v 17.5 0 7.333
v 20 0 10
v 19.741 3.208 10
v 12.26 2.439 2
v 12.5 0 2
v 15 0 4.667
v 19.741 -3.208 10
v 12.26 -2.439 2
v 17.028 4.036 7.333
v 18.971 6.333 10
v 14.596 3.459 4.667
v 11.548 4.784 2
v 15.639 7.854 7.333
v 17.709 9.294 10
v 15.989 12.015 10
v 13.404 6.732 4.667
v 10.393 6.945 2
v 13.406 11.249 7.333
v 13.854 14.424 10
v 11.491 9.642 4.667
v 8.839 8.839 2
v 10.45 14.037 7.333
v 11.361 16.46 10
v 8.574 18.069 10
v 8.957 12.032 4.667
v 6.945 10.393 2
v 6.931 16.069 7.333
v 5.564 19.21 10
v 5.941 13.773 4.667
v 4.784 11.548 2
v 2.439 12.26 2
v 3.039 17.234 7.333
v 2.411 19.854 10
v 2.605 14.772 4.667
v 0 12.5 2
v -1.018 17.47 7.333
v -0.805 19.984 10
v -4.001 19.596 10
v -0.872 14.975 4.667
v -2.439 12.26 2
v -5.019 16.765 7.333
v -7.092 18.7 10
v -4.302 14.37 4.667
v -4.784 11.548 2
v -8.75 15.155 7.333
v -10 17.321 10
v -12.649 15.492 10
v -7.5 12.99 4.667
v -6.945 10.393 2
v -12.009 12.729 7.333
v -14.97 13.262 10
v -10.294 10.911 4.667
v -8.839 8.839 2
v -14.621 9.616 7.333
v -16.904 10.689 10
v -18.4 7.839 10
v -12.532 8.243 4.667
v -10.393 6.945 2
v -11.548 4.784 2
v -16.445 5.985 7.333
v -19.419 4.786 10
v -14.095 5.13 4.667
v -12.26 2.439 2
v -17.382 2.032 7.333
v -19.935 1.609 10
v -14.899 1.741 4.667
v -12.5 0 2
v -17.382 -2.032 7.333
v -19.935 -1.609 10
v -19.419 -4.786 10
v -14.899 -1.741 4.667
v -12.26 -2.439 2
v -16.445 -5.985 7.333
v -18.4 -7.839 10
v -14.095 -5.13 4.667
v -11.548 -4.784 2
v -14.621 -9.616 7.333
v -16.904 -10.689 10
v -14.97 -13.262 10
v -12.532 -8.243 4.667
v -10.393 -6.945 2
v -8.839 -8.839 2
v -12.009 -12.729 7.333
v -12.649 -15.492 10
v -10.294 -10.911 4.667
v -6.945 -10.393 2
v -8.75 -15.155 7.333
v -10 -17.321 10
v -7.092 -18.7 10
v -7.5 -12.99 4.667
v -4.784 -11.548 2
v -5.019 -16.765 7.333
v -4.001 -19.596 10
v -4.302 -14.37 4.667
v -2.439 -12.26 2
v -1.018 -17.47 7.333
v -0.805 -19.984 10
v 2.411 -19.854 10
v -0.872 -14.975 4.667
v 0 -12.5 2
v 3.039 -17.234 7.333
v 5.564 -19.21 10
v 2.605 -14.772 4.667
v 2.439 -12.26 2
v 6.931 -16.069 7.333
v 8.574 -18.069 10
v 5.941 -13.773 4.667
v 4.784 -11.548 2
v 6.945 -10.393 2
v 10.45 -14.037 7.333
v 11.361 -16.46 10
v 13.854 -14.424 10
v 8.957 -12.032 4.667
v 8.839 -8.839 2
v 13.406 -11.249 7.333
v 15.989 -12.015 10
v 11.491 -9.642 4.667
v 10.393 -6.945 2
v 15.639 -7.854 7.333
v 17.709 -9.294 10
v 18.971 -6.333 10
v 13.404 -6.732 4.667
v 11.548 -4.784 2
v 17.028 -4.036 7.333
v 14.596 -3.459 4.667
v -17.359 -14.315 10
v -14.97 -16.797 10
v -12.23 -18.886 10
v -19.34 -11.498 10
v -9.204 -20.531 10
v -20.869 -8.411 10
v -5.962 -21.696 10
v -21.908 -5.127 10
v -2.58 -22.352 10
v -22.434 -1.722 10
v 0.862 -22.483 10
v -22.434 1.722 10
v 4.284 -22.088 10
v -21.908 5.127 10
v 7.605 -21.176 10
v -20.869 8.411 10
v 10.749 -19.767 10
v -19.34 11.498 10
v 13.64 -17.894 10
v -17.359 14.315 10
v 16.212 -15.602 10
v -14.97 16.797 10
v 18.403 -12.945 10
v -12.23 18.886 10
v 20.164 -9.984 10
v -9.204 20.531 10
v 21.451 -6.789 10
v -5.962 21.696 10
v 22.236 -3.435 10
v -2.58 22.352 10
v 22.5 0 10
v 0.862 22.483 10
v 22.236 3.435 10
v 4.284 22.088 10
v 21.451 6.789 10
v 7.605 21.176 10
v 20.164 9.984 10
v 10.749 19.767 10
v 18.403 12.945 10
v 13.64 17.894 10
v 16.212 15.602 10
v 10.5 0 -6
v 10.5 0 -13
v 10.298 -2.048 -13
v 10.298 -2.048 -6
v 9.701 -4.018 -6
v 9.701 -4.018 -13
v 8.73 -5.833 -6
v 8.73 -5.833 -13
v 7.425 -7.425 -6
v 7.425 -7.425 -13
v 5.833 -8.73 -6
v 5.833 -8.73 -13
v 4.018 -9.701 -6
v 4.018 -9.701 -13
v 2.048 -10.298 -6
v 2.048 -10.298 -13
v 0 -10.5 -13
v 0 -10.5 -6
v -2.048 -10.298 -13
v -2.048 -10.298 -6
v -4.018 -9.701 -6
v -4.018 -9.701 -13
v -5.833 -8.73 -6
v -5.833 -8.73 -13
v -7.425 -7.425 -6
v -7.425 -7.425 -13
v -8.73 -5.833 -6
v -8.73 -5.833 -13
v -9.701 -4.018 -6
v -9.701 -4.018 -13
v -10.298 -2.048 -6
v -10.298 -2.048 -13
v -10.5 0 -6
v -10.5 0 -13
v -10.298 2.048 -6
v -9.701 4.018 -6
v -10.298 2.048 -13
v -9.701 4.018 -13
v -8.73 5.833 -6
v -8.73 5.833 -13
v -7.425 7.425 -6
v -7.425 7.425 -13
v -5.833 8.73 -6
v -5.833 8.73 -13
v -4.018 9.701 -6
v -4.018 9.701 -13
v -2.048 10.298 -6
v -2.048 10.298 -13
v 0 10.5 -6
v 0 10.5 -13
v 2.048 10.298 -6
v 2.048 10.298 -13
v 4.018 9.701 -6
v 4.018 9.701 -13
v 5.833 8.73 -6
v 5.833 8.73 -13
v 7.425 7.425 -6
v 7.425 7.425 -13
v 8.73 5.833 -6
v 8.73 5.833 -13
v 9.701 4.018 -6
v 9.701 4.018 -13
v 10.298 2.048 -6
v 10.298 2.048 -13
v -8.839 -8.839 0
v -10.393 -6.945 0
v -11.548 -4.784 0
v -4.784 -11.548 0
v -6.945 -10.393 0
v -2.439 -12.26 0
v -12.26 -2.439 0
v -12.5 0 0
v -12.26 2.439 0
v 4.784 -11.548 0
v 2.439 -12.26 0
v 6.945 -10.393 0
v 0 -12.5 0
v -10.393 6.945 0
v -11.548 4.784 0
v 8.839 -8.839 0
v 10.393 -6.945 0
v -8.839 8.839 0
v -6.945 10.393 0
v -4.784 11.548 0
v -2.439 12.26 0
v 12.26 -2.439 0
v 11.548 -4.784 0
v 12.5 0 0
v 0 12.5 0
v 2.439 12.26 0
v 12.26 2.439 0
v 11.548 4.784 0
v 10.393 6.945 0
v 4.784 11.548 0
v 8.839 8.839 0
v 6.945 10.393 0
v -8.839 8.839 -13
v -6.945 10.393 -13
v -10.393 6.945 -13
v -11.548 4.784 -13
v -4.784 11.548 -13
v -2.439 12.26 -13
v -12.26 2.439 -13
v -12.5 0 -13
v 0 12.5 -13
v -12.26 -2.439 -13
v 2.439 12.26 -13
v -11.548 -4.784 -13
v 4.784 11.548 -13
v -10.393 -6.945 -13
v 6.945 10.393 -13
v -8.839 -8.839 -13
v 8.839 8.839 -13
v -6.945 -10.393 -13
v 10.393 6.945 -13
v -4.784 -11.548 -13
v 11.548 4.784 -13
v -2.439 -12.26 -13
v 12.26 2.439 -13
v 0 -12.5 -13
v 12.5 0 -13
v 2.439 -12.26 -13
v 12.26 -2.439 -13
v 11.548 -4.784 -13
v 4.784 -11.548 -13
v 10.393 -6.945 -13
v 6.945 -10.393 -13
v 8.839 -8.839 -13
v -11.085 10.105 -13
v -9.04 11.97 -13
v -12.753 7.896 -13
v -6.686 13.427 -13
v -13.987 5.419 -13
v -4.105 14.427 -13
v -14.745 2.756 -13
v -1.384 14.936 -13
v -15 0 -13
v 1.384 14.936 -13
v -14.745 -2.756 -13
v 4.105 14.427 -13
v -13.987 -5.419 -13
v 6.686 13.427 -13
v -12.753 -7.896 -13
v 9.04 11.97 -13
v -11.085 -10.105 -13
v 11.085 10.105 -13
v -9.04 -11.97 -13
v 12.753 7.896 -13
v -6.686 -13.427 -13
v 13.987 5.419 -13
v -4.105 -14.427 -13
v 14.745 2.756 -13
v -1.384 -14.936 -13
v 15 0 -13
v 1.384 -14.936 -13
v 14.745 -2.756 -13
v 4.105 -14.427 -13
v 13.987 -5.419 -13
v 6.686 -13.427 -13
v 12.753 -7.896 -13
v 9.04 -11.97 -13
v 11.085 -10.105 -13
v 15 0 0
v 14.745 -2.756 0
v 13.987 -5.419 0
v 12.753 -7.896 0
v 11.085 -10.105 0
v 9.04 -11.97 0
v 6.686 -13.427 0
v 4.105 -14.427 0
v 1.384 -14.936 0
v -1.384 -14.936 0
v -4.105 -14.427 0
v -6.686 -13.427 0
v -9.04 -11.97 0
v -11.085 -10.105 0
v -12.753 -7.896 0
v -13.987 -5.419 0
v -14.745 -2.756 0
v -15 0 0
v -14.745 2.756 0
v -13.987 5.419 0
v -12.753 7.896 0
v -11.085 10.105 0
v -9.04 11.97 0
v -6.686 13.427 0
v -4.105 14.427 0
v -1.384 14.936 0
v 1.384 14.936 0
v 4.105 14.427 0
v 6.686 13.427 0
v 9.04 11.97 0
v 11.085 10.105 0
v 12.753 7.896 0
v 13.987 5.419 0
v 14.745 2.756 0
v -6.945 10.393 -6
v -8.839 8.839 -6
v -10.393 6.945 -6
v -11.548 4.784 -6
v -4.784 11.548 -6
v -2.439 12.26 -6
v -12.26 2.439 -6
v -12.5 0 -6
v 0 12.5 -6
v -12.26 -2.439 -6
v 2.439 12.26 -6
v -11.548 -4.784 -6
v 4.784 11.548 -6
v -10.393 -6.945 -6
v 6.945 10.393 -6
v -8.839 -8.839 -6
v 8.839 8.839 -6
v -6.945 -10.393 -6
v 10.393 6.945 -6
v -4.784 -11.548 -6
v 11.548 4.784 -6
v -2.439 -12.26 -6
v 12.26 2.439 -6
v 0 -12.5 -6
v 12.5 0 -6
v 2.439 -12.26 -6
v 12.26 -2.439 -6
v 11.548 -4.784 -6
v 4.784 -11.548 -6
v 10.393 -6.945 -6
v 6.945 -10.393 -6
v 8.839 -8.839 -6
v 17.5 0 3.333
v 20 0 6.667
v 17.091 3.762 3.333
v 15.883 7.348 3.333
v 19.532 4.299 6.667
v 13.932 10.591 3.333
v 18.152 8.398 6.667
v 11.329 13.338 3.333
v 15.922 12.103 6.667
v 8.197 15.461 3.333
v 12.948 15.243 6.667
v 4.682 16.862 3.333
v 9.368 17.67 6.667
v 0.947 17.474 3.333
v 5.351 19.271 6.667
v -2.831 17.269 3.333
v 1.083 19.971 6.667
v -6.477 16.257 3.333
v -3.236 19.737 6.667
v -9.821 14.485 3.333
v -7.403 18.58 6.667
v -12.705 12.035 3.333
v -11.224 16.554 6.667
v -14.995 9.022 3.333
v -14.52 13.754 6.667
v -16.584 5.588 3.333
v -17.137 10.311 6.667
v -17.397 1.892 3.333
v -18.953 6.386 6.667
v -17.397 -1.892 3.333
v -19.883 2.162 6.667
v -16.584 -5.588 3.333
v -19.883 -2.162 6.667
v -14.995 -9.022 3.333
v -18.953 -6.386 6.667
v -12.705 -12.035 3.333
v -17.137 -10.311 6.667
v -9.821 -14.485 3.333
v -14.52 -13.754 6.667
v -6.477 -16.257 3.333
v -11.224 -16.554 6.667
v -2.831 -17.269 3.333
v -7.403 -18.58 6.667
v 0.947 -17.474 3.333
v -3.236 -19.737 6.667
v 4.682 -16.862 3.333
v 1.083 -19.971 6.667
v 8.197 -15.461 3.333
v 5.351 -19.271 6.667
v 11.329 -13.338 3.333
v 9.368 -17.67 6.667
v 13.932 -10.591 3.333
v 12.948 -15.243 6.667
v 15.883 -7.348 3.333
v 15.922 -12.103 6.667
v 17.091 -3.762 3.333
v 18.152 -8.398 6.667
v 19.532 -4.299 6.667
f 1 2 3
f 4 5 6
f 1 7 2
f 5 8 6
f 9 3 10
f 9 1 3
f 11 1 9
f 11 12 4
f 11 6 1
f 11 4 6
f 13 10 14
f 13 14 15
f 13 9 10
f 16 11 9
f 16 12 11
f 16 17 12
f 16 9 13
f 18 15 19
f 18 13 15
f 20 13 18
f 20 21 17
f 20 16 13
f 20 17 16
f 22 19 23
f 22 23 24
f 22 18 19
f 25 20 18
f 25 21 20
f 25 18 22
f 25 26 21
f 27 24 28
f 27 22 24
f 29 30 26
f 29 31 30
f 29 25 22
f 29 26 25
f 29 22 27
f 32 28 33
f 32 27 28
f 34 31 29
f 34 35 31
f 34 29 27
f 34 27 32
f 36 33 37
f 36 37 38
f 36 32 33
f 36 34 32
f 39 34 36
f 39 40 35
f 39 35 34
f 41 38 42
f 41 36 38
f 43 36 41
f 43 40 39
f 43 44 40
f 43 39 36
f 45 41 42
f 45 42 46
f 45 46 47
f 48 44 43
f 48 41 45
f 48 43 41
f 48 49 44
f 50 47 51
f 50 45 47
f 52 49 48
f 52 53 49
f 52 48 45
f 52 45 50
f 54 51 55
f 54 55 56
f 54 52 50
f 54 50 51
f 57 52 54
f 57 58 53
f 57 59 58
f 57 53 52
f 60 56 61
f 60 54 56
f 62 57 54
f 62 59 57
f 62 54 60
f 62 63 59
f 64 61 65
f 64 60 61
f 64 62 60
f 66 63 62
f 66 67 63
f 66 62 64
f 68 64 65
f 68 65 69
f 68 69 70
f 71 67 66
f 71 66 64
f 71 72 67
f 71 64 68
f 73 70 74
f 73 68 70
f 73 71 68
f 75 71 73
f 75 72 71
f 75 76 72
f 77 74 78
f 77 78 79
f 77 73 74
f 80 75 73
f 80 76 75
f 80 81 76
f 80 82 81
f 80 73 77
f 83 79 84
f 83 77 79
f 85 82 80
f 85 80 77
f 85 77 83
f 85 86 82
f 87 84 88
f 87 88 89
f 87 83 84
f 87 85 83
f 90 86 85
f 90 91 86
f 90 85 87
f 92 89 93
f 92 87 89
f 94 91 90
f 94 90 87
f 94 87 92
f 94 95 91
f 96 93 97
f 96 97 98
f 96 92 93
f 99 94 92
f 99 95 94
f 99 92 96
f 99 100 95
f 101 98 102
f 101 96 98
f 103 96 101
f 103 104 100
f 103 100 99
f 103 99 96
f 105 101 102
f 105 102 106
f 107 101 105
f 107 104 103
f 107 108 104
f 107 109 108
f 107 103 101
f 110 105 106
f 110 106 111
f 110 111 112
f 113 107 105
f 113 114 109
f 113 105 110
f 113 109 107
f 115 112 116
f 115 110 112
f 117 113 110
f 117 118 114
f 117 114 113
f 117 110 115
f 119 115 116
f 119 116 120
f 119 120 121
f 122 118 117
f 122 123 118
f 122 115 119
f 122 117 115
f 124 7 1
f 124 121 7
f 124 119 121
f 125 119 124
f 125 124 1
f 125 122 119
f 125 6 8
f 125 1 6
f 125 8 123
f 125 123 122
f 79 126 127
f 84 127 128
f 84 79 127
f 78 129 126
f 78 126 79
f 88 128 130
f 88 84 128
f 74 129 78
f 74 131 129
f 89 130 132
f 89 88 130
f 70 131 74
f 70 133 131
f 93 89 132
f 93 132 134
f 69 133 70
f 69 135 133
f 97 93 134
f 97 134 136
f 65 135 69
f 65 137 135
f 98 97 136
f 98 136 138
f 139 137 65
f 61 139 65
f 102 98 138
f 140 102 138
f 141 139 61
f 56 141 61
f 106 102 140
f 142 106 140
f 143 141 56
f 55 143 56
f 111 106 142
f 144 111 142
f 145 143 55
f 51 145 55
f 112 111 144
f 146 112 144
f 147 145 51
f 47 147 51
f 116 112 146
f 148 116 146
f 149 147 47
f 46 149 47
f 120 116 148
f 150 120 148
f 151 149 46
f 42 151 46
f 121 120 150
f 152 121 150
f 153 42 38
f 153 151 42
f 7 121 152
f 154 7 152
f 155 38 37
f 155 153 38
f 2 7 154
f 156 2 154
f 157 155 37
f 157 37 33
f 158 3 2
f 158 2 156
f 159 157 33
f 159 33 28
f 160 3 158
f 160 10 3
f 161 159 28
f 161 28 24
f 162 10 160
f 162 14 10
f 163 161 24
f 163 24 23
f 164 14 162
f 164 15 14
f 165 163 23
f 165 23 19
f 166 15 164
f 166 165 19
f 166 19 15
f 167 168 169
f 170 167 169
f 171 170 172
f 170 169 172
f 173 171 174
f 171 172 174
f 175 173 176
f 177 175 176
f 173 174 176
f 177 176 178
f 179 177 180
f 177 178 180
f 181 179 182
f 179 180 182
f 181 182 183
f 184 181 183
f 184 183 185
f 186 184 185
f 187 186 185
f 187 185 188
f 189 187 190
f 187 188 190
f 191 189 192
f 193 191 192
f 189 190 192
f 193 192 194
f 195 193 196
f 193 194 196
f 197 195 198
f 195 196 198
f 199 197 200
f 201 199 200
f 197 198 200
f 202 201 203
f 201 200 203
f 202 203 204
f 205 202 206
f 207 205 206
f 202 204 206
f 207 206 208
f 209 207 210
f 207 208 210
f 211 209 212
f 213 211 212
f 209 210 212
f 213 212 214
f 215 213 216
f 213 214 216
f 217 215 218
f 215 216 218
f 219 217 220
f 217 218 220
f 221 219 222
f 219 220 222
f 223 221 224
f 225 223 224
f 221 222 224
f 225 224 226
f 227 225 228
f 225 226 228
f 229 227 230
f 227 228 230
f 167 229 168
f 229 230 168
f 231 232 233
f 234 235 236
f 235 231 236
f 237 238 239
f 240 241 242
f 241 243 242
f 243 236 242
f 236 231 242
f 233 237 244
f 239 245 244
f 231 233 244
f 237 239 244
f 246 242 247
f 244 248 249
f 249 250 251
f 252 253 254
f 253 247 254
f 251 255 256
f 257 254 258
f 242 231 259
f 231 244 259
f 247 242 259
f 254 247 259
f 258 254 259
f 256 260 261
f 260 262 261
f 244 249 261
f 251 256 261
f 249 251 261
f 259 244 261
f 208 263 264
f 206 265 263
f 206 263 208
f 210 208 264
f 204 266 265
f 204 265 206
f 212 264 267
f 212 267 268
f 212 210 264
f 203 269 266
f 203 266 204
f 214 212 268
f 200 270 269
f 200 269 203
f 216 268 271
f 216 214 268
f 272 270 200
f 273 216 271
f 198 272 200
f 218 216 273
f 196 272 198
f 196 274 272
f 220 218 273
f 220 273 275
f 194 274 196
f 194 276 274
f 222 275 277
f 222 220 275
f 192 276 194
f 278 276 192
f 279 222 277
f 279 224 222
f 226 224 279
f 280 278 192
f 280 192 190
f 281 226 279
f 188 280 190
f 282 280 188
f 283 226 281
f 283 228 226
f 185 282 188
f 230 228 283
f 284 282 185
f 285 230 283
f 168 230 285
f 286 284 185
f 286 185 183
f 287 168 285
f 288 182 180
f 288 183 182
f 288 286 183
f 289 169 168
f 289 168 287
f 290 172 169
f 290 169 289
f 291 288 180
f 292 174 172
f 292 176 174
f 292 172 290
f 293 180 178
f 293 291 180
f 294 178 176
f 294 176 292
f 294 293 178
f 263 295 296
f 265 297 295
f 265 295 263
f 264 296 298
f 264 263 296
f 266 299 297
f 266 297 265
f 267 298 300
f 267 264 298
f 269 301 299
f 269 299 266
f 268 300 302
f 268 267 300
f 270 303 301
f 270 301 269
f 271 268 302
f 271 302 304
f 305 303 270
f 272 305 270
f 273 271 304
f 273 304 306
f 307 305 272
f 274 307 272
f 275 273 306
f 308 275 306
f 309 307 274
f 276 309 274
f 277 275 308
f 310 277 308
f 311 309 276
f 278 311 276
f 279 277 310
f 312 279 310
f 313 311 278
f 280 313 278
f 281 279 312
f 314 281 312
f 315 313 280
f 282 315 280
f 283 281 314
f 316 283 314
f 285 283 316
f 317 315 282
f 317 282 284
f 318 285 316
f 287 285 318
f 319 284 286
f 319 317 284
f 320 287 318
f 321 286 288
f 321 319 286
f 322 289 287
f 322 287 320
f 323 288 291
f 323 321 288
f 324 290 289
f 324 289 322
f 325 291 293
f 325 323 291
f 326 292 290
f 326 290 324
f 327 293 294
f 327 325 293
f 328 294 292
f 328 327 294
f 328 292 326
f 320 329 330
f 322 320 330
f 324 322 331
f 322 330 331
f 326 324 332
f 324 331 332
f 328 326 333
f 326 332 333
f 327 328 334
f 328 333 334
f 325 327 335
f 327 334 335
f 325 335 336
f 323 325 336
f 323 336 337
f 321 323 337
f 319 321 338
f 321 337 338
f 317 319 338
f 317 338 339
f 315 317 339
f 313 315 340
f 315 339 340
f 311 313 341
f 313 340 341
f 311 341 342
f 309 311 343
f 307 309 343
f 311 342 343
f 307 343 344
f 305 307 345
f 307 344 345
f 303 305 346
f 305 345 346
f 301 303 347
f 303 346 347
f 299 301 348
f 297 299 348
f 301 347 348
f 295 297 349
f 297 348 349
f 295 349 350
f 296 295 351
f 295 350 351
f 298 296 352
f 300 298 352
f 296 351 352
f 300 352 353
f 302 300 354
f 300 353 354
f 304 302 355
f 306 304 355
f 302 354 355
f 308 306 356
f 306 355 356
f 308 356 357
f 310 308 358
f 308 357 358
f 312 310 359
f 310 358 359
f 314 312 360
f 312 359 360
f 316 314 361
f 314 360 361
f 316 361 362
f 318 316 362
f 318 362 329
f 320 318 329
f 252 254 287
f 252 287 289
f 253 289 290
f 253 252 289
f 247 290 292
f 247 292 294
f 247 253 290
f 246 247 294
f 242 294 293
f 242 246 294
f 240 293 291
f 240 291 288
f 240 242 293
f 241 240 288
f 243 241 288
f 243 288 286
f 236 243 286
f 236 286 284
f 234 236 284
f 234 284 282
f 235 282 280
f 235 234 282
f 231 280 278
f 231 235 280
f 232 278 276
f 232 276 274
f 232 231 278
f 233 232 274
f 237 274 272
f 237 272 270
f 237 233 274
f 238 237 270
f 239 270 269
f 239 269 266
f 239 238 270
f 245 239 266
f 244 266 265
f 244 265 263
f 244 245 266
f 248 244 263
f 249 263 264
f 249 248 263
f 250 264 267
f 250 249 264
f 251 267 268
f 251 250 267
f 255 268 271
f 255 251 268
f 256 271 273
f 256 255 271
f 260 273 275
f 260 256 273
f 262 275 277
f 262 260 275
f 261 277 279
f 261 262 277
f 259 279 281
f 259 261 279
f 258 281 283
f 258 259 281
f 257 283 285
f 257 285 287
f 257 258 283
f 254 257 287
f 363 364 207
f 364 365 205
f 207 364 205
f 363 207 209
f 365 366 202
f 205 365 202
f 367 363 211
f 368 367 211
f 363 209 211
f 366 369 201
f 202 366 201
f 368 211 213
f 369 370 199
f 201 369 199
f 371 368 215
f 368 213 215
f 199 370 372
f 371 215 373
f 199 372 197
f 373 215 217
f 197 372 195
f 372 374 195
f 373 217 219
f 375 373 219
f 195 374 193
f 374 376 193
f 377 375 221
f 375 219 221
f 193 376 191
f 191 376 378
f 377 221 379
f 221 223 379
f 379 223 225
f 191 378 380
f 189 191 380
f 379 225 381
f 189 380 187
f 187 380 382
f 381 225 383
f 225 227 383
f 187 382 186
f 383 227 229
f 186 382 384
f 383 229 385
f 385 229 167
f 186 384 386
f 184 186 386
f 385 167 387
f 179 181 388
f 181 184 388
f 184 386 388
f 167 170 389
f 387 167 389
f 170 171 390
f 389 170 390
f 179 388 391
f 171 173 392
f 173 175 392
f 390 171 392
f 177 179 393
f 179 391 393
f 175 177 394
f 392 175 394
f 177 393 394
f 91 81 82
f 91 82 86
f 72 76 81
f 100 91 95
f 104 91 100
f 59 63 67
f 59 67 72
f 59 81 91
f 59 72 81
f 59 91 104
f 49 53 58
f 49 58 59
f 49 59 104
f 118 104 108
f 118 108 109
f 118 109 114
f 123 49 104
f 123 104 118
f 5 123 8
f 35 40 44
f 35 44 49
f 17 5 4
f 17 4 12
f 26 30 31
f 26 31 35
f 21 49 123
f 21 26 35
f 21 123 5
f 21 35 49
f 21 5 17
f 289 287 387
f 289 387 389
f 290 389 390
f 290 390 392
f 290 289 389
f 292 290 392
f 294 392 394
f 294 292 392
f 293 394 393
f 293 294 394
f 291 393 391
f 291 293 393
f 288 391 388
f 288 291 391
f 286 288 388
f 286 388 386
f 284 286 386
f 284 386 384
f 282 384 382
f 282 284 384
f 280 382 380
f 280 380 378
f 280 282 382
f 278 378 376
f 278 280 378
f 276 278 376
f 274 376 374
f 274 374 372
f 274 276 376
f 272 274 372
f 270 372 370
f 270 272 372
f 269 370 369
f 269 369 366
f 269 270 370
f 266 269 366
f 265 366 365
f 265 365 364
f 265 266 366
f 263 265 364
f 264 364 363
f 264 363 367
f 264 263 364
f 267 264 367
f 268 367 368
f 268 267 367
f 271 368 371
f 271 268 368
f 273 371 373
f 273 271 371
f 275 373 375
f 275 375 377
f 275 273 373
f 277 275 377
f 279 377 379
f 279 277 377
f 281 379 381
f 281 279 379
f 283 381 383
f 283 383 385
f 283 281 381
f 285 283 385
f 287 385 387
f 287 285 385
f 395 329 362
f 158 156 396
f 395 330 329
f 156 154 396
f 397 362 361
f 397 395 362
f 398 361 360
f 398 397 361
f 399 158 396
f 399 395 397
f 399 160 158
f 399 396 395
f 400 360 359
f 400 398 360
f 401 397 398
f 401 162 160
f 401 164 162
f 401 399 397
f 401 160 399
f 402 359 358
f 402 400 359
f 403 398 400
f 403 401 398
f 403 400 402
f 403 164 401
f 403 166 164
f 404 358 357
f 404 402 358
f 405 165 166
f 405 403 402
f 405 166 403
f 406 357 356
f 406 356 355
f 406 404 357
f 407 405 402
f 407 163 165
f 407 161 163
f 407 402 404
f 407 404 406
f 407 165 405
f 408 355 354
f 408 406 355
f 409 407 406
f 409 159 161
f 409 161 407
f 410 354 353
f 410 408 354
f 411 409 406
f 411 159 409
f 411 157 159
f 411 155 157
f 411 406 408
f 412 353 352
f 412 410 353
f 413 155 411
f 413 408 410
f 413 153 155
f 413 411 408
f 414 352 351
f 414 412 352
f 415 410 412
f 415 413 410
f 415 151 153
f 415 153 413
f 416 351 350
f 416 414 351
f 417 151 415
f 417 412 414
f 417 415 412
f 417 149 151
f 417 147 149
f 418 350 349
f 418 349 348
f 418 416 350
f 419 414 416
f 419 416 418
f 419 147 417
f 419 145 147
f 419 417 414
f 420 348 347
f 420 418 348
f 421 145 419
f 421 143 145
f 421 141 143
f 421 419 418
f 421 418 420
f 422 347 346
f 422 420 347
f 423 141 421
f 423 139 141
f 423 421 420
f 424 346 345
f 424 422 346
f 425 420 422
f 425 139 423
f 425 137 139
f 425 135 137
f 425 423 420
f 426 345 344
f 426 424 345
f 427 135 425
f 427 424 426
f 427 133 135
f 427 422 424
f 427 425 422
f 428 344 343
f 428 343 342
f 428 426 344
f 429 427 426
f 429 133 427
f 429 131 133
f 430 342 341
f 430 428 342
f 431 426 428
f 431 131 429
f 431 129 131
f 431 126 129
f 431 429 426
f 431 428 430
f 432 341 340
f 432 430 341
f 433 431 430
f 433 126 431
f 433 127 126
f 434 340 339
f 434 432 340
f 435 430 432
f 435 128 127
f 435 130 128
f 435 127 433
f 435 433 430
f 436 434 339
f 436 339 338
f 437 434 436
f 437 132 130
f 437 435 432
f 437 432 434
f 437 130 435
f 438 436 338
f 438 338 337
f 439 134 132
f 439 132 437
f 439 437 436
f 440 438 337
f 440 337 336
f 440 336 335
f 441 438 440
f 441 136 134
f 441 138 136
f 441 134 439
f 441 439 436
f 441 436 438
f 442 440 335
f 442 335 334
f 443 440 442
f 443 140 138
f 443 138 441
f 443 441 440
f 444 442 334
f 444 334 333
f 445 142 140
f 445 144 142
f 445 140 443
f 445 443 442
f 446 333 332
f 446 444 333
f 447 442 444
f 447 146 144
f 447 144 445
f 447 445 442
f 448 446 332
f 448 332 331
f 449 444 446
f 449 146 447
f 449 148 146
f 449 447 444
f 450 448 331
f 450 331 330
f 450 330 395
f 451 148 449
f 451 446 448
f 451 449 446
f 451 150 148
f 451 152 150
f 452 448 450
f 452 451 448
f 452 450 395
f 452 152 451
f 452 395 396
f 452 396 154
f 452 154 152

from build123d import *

# Parameters (mm, degrees)
F0_R      = 15
F2_R      = 22.5
F4_R      = 20
F6_R      = 12.5
F8_R      = 15
F8_R_2    = 12.5
F9_DEPTH  = 13
F10_R     = 12.5
F10_R_2   = 10.5
F11_DEPTH = 7


with BuildPart() as f3:
    # F0 (on Top) → F3 section 0
    with BuildSketch(Plane.XY):
        Circle(F0_R)
    # F2 (on offset) → F3 section 1
    with BuildSketch(Plane.XY.offset(10)):
        Circle(F2_R)
    loft()

    # F4 (on face) → F7 section 0
    with BuildSketch(Plane.XY.offset(10)):
        Circle(F4_R)
    # F6 (on offset) → F7 section 1
    with BuildSketch(Plane.XY.offset(2)):
        Circle(F6_R)
    loft(mode=Mode.SUBTRACT)

    # F8 (on face) → F9 (join)
    with BuildSketch(Plane(origin=(0, 0, 0), x_dir=(1, 0, 0), z_dir=(0, 0, -1))):
        Circle(F8_R)
        Circle(F8_R_2, mode=Mode.SUBTRACT)
    extrude(amount=F9_DEPTH)


with BuildPart() as f11:
    # F10 (on face) → F11 (new body)
    with BuildSketch(Plane(origin=(0, 0, -13), x_dir=(1, 0, 0), z_dir=(0, 0, -1))):
        Circle(F10_R)
        Circle(F10_R_2, mode=Mode.SUBTRACT)
    extrude(amount=-F11_DEPTH)


solid = Compound([f3.part, f11.part])
